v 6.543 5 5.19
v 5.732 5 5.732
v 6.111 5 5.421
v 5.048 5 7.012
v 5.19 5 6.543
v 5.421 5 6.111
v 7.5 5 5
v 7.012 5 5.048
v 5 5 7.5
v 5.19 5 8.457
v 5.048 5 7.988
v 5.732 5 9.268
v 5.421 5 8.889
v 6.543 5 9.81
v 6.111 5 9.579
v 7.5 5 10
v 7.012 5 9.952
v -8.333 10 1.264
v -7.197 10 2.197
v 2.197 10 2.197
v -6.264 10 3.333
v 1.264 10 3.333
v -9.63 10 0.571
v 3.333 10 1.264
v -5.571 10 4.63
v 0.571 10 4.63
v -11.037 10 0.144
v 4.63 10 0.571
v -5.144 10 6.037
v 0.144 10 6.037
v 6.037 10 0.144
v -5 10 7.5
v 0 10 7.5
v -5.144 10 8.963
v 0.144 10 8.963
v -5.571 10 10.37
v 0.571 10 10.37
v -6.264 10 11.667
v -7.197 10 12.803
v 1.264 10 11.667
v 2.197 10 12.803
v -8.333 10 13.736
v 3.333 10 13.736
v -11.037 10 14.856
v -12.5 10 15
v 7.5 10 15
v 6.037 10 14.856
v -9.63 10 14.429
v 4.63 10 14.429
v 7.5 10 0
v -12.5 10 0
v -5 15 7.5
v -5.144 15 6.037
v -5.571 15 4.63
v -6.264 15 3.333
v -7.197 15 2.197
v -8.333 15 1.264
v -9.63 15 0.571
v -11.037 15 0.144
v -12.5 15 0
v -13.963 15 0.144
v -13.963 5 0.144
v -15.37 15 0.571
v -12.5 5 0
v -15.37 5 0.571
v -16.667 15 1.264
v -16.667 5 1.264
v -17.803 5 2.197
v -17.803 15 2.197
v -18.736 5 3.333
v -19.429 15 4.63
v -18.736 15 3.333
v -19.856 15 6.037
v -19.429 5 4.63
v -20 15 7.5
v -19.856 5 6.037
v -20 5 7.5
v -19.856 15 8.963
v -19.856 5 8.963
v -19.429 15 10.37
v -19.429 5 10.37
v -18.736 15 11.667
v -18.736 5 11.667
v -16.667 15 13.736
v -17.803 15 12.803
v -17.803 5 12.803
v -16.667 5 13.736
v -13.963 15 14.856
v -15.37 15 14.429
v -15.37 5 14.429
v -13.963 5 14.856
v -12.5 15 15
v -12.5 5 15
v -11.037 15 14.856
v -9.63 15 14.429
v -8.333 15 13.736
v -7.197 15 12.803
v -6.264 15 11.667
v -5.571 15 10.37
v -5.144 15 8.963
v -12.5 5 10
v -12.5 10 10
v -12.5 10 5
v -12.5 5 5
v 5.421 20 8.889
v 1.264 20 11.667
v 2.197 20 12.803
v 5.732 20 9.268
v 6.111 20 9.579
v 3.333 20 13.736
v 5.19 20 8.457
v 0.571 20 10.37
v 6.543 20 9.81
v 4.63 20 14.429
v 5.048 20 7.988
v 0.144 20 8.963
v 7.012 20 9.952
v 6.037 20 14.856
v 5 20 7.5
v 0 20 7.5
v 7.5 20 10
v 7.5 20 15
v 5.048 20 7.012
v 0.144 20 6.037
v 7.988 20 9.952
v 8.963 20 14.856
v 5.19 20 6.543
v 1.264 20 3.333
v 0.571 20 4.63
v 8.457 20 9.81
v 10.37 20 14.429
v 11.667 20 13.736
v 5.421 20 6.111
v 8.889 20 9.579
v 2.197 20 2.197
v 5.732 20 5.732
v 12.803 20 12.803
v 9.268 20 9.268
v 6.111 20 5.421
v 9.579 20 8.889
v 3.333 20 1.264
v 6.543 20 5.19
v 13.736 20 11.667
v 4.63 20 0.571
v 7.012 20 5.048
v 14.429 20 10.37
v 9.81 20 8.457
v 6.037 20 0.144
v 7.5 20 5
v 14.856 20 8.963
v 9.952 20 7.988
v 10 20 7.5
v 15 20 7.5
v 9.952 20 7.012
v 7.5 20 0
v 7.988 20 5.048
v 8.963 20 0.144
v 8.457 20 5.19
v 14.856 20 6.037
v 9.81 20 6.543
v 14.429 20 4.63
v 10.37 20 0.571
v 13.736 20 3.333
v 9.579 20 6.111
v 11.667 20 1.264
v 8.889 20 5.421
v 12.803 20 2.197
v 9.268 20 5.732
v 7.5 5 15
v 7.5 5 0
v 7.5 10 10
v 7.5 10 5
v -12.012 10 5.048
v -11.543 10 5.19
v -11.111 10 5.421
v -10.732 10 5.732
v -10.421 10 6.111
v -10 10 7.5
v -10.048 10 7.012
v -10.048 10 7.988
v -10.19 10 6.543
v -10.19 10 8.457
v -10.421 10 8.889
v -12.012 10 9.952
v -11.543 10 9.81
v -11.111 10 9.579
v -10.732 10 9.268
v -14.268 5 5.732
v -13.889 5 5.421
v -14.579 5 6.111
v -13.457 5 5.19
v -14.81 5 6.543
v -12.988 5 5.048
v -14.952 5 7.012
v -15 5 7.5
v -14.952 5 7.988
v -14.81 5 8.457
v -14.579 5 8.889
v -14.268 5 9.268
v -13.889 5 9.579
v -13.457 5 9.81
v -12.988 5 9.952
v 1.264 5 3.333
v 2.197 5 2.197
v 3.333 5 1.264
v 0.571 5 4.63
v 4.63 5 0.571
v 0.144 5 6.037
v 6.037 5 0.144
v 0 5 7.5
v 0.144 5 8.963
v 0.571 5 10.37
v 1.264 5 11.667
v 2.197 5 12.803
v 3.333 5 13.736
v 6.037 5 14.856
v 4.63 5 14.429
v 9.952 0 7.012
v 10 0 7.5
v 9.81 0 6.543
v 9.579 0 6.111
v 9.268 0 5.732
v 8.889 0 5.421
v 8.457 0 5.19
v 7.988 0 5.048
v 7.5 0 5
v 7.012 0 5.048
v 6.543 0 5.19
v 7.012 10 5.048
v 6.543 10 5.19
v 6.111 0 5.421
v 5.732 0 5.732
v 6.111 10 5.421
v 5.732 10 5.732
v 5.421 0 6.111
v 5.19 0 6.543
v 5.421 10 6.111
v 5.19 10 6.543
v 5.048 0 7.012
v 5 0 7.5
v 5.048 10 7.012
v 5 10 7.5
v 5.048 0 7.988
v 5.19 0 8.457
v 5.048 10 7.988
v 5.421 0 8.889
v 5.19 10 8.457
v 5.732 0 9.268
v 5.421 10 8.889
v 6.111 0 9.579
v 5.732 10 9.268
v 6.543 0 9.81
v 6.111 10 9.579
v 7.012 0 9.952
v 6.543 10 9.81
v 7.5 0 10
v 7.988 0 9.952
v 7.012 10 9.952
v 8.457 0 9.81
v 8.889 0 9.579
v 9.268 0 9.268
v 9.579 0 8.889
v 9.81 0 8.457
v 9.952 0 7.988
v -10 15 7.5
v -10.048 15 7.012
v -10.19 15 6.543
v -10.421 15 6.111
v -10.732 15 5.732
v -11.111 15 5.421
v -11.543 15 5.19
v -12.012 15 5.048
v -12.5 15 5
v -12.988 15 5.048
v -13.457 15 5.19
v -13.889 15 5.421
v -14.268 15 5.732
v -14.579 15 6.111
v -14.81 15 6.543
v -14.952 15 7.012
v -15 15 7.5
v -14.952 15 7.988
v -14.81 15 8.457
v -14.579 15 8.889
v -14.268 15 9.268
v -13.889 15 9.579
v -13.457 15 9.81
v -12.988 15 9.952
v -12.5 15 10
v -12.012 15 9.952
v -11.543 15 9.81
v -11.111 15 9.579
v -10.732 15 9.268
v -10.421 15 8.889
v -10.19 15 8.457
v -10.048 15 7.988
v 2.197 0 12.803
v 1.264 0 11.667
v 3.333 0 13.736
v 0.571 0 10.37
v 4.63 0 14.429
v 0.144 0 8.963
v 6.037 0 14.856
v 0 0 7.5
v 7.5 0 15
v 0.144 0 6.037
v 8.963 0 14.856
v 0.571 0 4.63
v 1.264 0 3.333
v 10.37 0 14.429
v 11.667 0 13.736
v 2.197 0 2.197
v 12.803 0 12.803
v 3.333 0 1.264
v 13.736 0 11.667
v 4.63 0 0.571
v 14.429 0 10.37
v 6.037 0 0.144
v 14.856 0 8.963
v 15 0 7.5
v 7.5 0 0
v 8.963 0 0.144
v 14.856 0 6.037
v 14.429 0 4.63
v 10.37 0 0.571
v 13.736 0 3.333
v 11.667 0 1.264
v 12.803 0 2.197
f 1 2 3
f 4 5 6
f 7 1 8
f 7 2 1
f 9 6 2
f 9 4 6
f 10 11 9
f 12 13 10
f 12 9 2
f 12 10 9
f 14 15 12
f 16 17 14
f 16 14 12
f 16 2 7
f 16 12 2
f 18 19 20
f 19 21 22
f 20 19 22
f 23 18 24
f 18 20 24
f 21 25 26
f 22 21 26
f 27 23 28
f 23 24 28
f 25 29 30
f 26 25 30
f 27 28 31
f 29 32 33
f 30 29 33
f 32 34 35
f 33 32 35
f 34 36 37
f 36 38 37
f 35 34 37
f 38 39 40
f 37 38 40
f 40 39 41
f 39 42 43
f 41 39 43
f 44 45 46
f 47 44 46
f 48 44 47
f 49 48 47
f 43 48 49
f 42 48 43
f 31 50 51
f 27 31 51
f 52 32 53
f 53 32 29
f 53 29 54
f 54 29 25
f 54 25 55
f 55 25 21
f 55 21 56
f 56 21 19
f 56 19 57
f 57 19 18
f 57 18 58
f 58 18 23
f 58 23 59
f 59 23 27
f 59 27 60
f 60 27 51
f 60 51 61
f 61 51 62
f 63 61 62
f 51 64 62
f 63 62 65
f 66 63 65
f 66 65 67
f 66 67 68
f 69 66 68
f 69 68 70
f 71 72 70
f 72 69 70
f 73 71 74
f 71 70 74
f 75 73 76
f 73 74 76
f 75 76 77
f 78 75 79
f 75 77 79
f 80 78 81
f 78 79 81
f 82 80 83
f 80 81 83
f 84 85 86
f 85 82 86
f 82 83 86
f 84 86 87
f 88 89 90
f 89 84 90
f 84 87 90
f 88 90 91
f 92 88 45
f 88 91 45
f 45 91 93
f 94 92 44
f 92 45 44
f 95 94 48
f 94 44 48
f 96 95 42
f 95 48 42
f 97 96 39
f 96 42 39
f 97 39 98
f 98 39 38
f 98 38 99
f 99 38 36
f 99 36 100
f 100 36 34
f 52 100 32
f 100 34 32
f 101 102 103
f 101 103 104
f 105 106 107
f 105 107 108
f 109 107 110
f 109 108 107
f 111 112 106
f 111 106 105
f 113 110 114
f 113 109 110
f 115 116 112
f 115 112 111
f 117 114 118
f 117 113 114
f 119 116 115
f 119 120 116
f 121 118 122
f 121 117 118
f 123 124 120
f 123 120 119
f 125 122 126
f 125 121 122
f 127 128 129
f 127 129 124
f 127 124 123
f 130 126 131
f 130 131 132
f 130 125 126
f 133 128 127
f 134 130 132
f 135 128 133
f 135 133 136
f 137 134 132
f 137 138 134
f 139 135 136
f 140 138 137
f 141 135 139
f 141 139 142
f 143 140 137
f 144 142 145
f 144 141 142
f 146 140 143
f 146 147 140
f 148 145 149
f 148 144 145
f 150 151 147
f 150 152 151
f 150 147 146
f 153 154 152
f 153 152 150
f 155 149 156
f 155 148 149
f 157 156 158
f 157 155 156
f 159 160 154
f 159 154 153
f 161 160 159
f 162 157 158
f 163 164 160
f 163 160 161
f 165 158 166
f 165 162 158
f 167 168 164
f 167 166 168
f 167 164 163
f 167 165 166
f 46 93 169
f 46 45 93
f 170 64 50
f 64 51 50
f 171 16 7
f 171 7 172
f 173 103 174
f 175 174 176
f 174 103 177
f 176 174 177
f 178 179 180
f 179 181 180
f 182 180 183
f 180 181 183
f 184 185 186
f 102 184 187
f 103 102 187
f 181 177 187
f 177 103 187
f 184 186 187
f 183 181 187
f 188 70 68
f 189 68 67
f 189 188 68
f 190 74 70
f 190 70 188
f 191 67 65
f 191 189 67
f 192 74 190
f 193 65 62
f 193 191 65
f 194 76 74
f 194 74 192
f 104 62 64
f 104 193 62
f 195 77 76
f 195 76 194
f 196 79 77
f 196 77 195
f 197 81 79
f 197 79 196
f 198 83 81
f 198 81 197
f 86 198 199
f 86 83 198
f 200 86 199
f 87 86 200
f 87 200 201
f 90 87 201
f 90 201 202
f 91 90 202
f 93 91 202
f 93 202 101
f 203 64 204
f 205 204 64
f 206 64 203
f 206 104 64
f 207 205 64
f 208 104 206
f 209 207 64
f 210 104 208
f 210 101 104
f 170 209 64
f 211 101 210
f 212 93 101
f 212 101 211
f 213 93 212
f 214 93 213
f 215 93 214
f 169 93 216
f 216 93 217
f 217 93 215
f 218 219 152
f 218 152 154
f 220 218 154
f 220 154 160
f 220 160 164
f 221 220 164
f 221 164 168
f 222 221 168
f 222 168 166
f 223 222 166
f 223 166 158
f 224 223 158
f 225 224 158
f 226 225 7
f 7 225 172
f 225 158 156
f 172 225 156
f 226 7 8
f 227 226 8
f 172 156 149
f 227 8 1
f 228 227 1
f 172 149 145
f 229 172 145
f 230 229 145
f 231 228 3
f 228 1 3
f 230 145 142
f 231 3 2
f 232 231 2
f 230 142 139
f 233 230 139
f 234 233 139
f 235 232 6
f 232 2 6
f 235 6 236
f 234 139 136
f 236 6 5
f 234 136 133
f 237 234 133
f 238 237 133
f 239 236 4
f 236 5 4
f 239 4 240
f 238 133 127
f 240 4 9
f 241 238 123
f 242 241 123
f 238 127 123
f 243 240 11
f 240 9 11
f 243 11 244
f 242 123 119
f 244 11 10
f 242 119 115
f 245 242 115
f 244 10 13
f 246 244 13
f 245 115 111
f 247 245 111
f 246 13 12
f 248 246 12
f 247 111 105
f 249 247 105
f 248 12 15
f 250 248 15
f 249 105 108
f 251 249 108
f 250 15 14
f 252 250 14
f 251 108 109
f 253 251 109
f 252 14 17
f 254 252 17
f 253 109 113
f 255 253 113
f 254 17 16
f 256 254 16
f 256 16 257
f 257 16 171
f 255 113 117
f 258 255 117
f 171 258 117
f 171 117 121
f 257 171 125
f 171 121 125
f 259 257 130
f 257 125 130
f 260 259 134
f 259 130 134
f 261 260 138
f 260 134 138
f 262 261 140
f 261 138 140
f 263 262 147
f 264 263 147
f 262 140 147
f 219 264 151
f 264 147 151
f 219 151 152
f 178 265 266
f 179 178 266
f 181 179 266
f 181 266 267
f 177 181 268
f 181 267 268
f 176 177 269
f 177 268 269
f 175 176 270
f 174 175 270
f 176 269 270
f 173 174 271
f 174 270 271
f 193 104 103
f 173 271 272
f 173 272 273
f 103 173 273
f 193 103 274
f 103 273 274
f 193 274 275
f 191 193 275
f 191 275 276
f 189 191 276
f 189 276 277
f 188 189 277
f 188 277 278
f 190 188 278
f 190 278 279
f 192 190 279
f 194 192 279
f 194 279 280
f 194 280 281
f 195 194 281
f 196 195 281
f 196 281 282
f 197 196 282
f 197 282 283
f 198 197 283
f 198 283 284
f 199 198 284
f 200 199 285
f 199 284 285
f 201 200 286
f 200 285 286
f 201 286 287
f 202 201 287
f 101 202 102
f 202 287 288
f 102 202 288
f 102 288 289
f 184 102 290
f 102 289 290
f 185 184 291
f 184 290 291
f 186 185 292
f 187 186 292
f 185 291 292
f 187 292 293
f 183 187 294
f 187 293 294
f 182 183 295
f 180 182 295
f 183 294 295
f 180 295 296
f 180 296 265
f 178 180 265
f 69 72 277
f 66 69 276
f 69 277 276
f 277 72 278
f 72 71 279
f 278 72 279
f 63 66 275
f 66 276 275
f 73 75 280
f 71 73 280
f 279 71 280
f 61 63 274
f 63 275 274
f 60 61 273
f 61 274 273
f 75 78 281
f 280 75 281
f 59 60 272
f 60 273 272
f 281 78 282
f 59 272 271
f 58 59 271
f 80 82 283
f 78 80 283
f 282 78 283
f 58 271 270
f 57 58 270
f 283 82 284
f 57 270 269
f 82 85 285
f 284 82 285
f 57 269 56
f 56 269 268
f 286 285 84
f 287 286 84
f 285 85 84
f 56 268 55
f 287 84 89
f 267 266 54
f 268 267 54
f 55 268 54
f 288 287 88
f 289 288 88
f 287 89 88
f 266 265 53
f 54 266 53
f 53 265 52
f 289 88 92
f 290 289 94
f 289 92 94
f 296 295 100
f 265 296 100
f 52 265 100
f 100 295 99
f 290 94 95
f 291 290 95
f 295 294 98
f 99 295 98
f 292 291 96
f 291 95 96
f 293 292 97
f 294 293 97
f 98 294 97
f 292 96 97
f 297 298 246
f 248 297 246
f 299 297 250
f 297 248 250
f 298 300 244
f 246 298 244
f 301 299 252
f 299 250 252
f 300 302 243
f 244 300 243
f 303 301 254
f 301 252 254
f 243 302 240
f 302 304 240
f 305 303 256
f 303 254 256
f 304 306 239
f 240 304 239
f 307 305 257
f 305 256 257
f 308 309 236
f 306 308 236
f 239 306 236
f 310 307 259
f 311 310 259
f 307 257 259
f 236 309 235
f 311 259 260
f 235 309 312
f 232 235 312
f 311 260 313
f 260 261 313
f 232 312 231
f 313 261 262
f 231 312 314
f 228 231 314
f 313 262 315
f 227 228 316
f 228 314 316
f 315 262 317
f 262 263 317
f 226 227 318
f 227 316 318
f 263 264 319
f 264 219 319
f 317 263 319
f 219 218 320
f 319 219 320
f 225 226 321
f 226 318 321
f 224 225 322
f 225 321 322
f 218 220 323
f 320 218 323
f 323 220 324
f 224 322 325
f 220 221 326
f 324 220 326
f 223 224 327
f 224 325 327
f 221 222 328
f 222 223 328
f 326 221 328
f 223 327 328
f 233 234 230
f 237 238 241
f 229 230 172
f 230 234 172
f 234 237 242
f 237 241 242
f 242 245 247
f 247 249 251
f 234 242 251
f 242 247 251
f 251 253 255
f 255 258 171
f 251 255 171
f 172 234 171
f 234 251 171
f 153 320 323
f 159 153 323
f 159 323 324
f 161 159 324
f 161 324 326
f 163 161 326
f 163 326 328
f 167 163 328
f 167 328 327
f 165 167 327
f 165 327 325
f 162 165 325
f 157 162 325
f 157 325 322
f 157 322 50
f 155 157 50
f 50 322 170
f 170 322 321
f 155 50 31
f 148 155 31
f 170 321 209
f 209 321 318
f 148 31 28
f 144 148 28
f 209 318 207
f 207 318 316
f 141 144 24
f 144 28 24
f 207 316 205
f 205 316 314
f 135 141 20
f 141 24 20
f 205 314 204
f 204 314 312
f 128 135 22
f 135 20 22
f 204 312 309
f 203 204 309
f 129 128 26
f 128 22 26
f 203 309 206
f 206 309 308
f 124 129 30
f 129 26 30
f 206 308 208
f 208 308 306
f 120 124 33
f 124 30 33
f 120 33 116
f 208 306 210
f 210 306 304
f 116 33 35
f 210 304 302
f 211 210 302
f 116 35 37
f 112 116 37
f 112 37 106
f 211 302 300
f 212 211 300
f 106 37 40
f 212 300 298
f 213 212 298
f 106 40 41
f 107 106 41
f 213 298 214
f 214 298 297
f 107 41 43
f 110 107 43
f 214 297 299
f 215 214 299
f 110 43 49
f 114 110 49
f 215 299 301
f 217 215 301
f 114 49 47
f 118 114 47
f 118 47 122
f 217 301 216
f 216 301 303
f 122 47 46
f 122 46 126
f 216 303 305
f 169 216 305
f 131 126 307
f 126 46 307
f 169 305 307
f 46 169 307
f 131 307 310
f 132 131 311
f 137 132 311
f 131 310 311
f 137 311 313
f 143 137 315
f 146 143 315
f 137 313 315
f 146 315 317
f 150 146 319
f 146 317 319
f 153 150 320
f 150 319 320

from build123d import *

# Parameters (mm, degrees)
CROQUIS1_R                = 7.5
SALIENTE_EXTRUIR1_DEPTH   = 20
SALIENTE_EXTRUIR1_2_DEPTH = 20
CROQUIS2_W                = 15
CROQUIS2_H                = 5
CORTAR_EXTRUIR1_DEPTH     = 20
CROQUIS3_W                = 15
CROQUIS3_H                = 5
CORTAR_EXTRUIR2_DEPTH     = 20
CROQUIS4_R                = 2.5
CORTAR_EXTRUIR3_DEPTH     = 20
CROQUIS5_R                = 2.5
CORTAR_EXTRUIR4_DEPTH     = 20
CROQUIS6_W                = 20
CROQUIS6_H                = 2.5
EXTRUIR_L_MINA1_DEPTH     = 15


with BuildPart() as part:
    # Croquis1 → Saliente-Extruir1 (new body)
    with BuildSketch(Plane(origin=(0, 0, 0), x_dir=(1, 0, 0), z_dir=(0, 1, 0))):
        with Locations((7.5, -7.5)):
            Circle(CROQUIS1_R)
    extrude(amount=SALIENTE_EXTRUIR1_DEPTH)

    # Croquis5 → Cortar-Extruir4 (cut)
    with BuildSketch(Plane(origin=(0, 20, 0), x_dir=(1, 0, 0), z_dir=(0, 1, 0))):
        with Locations((7.5, -7.5)):
            Circle(CROQUIS5_R)
    extrude(amount=-CORTAR_EXTRUIR4_DEPTH, mode=Mode.SUBTRACT)



with BuildPart() as body_2:
    # Croquis1 → Saliente-Extruir1 2 (new body)
    with BuildSketch(Plane(origin=(0, 0, 0), x_dir=(1, 0, 0), z_dir=(0, 1, 0))):
        with Locations((-12.5, -7.5)):
            Circle(CROQUIS1_R)
    extrude(amount=SALIENTE_EXTRUIR1_2_DEPTH)

    # Croquis2 → Cortar-Extruir1 (cut)
    with BuildSketch(Plane.XY.offset(15)):
        with Locations((-12.5, 2.5)):
            Rectangle(CROQUIS2_W, CROQUIS2_H)
    extrude(amount=-CORTAR_EXTRUIR1_DEPTH, mode=Mode.SUBTRACT)

    # Croquis3 → Cortar-Extruir2 (cut)
    with BuildSketch(Plane.XY.offset(15)):
        with Locations((-12.5, 17.5)):
            Rectangle(CROQUIS3_W, CROQUIS3_H)
    extrude(amount=-CORTAR_EXTRUIR2_DEPTH, mode=Mode.SUBTRACT)

    # Croquis4 → Cortar-Extruir3 (cut)
    with BuildSketch(Plane(origin=(0, 15, 0), x_dir=(1, 0, 0), z_dir=(0, 1, 0))):
        with Locations((-12.5, -7.5)):
            Circle(CROQUIS4_R)
    extrude(amount=-CORTAR_EXTRUIR3_DEPTH, mode=Mode.SUBTRACT)


with BuildPart() as part_1:
    add(part.part)

    add(body_2.part)  # Extruir-Lámina1 merges body 2
    # Croquis6 → Extruir-Lámina1 (add)
    with BuildSketch(Plane.XY.offset(15)):
        with Locations((-2.5, 6.25)):
            Rectangle(CROQUIS6_W, CROQUIS6_H)
        with Locations((-2.5, 8.75)):
            Rectangle(CROQUIS6_W, CROQUIS6_H)
    extrude(amount=-EXTRUIR_L_MINA1_DEPTH)


solid = part_1.part
